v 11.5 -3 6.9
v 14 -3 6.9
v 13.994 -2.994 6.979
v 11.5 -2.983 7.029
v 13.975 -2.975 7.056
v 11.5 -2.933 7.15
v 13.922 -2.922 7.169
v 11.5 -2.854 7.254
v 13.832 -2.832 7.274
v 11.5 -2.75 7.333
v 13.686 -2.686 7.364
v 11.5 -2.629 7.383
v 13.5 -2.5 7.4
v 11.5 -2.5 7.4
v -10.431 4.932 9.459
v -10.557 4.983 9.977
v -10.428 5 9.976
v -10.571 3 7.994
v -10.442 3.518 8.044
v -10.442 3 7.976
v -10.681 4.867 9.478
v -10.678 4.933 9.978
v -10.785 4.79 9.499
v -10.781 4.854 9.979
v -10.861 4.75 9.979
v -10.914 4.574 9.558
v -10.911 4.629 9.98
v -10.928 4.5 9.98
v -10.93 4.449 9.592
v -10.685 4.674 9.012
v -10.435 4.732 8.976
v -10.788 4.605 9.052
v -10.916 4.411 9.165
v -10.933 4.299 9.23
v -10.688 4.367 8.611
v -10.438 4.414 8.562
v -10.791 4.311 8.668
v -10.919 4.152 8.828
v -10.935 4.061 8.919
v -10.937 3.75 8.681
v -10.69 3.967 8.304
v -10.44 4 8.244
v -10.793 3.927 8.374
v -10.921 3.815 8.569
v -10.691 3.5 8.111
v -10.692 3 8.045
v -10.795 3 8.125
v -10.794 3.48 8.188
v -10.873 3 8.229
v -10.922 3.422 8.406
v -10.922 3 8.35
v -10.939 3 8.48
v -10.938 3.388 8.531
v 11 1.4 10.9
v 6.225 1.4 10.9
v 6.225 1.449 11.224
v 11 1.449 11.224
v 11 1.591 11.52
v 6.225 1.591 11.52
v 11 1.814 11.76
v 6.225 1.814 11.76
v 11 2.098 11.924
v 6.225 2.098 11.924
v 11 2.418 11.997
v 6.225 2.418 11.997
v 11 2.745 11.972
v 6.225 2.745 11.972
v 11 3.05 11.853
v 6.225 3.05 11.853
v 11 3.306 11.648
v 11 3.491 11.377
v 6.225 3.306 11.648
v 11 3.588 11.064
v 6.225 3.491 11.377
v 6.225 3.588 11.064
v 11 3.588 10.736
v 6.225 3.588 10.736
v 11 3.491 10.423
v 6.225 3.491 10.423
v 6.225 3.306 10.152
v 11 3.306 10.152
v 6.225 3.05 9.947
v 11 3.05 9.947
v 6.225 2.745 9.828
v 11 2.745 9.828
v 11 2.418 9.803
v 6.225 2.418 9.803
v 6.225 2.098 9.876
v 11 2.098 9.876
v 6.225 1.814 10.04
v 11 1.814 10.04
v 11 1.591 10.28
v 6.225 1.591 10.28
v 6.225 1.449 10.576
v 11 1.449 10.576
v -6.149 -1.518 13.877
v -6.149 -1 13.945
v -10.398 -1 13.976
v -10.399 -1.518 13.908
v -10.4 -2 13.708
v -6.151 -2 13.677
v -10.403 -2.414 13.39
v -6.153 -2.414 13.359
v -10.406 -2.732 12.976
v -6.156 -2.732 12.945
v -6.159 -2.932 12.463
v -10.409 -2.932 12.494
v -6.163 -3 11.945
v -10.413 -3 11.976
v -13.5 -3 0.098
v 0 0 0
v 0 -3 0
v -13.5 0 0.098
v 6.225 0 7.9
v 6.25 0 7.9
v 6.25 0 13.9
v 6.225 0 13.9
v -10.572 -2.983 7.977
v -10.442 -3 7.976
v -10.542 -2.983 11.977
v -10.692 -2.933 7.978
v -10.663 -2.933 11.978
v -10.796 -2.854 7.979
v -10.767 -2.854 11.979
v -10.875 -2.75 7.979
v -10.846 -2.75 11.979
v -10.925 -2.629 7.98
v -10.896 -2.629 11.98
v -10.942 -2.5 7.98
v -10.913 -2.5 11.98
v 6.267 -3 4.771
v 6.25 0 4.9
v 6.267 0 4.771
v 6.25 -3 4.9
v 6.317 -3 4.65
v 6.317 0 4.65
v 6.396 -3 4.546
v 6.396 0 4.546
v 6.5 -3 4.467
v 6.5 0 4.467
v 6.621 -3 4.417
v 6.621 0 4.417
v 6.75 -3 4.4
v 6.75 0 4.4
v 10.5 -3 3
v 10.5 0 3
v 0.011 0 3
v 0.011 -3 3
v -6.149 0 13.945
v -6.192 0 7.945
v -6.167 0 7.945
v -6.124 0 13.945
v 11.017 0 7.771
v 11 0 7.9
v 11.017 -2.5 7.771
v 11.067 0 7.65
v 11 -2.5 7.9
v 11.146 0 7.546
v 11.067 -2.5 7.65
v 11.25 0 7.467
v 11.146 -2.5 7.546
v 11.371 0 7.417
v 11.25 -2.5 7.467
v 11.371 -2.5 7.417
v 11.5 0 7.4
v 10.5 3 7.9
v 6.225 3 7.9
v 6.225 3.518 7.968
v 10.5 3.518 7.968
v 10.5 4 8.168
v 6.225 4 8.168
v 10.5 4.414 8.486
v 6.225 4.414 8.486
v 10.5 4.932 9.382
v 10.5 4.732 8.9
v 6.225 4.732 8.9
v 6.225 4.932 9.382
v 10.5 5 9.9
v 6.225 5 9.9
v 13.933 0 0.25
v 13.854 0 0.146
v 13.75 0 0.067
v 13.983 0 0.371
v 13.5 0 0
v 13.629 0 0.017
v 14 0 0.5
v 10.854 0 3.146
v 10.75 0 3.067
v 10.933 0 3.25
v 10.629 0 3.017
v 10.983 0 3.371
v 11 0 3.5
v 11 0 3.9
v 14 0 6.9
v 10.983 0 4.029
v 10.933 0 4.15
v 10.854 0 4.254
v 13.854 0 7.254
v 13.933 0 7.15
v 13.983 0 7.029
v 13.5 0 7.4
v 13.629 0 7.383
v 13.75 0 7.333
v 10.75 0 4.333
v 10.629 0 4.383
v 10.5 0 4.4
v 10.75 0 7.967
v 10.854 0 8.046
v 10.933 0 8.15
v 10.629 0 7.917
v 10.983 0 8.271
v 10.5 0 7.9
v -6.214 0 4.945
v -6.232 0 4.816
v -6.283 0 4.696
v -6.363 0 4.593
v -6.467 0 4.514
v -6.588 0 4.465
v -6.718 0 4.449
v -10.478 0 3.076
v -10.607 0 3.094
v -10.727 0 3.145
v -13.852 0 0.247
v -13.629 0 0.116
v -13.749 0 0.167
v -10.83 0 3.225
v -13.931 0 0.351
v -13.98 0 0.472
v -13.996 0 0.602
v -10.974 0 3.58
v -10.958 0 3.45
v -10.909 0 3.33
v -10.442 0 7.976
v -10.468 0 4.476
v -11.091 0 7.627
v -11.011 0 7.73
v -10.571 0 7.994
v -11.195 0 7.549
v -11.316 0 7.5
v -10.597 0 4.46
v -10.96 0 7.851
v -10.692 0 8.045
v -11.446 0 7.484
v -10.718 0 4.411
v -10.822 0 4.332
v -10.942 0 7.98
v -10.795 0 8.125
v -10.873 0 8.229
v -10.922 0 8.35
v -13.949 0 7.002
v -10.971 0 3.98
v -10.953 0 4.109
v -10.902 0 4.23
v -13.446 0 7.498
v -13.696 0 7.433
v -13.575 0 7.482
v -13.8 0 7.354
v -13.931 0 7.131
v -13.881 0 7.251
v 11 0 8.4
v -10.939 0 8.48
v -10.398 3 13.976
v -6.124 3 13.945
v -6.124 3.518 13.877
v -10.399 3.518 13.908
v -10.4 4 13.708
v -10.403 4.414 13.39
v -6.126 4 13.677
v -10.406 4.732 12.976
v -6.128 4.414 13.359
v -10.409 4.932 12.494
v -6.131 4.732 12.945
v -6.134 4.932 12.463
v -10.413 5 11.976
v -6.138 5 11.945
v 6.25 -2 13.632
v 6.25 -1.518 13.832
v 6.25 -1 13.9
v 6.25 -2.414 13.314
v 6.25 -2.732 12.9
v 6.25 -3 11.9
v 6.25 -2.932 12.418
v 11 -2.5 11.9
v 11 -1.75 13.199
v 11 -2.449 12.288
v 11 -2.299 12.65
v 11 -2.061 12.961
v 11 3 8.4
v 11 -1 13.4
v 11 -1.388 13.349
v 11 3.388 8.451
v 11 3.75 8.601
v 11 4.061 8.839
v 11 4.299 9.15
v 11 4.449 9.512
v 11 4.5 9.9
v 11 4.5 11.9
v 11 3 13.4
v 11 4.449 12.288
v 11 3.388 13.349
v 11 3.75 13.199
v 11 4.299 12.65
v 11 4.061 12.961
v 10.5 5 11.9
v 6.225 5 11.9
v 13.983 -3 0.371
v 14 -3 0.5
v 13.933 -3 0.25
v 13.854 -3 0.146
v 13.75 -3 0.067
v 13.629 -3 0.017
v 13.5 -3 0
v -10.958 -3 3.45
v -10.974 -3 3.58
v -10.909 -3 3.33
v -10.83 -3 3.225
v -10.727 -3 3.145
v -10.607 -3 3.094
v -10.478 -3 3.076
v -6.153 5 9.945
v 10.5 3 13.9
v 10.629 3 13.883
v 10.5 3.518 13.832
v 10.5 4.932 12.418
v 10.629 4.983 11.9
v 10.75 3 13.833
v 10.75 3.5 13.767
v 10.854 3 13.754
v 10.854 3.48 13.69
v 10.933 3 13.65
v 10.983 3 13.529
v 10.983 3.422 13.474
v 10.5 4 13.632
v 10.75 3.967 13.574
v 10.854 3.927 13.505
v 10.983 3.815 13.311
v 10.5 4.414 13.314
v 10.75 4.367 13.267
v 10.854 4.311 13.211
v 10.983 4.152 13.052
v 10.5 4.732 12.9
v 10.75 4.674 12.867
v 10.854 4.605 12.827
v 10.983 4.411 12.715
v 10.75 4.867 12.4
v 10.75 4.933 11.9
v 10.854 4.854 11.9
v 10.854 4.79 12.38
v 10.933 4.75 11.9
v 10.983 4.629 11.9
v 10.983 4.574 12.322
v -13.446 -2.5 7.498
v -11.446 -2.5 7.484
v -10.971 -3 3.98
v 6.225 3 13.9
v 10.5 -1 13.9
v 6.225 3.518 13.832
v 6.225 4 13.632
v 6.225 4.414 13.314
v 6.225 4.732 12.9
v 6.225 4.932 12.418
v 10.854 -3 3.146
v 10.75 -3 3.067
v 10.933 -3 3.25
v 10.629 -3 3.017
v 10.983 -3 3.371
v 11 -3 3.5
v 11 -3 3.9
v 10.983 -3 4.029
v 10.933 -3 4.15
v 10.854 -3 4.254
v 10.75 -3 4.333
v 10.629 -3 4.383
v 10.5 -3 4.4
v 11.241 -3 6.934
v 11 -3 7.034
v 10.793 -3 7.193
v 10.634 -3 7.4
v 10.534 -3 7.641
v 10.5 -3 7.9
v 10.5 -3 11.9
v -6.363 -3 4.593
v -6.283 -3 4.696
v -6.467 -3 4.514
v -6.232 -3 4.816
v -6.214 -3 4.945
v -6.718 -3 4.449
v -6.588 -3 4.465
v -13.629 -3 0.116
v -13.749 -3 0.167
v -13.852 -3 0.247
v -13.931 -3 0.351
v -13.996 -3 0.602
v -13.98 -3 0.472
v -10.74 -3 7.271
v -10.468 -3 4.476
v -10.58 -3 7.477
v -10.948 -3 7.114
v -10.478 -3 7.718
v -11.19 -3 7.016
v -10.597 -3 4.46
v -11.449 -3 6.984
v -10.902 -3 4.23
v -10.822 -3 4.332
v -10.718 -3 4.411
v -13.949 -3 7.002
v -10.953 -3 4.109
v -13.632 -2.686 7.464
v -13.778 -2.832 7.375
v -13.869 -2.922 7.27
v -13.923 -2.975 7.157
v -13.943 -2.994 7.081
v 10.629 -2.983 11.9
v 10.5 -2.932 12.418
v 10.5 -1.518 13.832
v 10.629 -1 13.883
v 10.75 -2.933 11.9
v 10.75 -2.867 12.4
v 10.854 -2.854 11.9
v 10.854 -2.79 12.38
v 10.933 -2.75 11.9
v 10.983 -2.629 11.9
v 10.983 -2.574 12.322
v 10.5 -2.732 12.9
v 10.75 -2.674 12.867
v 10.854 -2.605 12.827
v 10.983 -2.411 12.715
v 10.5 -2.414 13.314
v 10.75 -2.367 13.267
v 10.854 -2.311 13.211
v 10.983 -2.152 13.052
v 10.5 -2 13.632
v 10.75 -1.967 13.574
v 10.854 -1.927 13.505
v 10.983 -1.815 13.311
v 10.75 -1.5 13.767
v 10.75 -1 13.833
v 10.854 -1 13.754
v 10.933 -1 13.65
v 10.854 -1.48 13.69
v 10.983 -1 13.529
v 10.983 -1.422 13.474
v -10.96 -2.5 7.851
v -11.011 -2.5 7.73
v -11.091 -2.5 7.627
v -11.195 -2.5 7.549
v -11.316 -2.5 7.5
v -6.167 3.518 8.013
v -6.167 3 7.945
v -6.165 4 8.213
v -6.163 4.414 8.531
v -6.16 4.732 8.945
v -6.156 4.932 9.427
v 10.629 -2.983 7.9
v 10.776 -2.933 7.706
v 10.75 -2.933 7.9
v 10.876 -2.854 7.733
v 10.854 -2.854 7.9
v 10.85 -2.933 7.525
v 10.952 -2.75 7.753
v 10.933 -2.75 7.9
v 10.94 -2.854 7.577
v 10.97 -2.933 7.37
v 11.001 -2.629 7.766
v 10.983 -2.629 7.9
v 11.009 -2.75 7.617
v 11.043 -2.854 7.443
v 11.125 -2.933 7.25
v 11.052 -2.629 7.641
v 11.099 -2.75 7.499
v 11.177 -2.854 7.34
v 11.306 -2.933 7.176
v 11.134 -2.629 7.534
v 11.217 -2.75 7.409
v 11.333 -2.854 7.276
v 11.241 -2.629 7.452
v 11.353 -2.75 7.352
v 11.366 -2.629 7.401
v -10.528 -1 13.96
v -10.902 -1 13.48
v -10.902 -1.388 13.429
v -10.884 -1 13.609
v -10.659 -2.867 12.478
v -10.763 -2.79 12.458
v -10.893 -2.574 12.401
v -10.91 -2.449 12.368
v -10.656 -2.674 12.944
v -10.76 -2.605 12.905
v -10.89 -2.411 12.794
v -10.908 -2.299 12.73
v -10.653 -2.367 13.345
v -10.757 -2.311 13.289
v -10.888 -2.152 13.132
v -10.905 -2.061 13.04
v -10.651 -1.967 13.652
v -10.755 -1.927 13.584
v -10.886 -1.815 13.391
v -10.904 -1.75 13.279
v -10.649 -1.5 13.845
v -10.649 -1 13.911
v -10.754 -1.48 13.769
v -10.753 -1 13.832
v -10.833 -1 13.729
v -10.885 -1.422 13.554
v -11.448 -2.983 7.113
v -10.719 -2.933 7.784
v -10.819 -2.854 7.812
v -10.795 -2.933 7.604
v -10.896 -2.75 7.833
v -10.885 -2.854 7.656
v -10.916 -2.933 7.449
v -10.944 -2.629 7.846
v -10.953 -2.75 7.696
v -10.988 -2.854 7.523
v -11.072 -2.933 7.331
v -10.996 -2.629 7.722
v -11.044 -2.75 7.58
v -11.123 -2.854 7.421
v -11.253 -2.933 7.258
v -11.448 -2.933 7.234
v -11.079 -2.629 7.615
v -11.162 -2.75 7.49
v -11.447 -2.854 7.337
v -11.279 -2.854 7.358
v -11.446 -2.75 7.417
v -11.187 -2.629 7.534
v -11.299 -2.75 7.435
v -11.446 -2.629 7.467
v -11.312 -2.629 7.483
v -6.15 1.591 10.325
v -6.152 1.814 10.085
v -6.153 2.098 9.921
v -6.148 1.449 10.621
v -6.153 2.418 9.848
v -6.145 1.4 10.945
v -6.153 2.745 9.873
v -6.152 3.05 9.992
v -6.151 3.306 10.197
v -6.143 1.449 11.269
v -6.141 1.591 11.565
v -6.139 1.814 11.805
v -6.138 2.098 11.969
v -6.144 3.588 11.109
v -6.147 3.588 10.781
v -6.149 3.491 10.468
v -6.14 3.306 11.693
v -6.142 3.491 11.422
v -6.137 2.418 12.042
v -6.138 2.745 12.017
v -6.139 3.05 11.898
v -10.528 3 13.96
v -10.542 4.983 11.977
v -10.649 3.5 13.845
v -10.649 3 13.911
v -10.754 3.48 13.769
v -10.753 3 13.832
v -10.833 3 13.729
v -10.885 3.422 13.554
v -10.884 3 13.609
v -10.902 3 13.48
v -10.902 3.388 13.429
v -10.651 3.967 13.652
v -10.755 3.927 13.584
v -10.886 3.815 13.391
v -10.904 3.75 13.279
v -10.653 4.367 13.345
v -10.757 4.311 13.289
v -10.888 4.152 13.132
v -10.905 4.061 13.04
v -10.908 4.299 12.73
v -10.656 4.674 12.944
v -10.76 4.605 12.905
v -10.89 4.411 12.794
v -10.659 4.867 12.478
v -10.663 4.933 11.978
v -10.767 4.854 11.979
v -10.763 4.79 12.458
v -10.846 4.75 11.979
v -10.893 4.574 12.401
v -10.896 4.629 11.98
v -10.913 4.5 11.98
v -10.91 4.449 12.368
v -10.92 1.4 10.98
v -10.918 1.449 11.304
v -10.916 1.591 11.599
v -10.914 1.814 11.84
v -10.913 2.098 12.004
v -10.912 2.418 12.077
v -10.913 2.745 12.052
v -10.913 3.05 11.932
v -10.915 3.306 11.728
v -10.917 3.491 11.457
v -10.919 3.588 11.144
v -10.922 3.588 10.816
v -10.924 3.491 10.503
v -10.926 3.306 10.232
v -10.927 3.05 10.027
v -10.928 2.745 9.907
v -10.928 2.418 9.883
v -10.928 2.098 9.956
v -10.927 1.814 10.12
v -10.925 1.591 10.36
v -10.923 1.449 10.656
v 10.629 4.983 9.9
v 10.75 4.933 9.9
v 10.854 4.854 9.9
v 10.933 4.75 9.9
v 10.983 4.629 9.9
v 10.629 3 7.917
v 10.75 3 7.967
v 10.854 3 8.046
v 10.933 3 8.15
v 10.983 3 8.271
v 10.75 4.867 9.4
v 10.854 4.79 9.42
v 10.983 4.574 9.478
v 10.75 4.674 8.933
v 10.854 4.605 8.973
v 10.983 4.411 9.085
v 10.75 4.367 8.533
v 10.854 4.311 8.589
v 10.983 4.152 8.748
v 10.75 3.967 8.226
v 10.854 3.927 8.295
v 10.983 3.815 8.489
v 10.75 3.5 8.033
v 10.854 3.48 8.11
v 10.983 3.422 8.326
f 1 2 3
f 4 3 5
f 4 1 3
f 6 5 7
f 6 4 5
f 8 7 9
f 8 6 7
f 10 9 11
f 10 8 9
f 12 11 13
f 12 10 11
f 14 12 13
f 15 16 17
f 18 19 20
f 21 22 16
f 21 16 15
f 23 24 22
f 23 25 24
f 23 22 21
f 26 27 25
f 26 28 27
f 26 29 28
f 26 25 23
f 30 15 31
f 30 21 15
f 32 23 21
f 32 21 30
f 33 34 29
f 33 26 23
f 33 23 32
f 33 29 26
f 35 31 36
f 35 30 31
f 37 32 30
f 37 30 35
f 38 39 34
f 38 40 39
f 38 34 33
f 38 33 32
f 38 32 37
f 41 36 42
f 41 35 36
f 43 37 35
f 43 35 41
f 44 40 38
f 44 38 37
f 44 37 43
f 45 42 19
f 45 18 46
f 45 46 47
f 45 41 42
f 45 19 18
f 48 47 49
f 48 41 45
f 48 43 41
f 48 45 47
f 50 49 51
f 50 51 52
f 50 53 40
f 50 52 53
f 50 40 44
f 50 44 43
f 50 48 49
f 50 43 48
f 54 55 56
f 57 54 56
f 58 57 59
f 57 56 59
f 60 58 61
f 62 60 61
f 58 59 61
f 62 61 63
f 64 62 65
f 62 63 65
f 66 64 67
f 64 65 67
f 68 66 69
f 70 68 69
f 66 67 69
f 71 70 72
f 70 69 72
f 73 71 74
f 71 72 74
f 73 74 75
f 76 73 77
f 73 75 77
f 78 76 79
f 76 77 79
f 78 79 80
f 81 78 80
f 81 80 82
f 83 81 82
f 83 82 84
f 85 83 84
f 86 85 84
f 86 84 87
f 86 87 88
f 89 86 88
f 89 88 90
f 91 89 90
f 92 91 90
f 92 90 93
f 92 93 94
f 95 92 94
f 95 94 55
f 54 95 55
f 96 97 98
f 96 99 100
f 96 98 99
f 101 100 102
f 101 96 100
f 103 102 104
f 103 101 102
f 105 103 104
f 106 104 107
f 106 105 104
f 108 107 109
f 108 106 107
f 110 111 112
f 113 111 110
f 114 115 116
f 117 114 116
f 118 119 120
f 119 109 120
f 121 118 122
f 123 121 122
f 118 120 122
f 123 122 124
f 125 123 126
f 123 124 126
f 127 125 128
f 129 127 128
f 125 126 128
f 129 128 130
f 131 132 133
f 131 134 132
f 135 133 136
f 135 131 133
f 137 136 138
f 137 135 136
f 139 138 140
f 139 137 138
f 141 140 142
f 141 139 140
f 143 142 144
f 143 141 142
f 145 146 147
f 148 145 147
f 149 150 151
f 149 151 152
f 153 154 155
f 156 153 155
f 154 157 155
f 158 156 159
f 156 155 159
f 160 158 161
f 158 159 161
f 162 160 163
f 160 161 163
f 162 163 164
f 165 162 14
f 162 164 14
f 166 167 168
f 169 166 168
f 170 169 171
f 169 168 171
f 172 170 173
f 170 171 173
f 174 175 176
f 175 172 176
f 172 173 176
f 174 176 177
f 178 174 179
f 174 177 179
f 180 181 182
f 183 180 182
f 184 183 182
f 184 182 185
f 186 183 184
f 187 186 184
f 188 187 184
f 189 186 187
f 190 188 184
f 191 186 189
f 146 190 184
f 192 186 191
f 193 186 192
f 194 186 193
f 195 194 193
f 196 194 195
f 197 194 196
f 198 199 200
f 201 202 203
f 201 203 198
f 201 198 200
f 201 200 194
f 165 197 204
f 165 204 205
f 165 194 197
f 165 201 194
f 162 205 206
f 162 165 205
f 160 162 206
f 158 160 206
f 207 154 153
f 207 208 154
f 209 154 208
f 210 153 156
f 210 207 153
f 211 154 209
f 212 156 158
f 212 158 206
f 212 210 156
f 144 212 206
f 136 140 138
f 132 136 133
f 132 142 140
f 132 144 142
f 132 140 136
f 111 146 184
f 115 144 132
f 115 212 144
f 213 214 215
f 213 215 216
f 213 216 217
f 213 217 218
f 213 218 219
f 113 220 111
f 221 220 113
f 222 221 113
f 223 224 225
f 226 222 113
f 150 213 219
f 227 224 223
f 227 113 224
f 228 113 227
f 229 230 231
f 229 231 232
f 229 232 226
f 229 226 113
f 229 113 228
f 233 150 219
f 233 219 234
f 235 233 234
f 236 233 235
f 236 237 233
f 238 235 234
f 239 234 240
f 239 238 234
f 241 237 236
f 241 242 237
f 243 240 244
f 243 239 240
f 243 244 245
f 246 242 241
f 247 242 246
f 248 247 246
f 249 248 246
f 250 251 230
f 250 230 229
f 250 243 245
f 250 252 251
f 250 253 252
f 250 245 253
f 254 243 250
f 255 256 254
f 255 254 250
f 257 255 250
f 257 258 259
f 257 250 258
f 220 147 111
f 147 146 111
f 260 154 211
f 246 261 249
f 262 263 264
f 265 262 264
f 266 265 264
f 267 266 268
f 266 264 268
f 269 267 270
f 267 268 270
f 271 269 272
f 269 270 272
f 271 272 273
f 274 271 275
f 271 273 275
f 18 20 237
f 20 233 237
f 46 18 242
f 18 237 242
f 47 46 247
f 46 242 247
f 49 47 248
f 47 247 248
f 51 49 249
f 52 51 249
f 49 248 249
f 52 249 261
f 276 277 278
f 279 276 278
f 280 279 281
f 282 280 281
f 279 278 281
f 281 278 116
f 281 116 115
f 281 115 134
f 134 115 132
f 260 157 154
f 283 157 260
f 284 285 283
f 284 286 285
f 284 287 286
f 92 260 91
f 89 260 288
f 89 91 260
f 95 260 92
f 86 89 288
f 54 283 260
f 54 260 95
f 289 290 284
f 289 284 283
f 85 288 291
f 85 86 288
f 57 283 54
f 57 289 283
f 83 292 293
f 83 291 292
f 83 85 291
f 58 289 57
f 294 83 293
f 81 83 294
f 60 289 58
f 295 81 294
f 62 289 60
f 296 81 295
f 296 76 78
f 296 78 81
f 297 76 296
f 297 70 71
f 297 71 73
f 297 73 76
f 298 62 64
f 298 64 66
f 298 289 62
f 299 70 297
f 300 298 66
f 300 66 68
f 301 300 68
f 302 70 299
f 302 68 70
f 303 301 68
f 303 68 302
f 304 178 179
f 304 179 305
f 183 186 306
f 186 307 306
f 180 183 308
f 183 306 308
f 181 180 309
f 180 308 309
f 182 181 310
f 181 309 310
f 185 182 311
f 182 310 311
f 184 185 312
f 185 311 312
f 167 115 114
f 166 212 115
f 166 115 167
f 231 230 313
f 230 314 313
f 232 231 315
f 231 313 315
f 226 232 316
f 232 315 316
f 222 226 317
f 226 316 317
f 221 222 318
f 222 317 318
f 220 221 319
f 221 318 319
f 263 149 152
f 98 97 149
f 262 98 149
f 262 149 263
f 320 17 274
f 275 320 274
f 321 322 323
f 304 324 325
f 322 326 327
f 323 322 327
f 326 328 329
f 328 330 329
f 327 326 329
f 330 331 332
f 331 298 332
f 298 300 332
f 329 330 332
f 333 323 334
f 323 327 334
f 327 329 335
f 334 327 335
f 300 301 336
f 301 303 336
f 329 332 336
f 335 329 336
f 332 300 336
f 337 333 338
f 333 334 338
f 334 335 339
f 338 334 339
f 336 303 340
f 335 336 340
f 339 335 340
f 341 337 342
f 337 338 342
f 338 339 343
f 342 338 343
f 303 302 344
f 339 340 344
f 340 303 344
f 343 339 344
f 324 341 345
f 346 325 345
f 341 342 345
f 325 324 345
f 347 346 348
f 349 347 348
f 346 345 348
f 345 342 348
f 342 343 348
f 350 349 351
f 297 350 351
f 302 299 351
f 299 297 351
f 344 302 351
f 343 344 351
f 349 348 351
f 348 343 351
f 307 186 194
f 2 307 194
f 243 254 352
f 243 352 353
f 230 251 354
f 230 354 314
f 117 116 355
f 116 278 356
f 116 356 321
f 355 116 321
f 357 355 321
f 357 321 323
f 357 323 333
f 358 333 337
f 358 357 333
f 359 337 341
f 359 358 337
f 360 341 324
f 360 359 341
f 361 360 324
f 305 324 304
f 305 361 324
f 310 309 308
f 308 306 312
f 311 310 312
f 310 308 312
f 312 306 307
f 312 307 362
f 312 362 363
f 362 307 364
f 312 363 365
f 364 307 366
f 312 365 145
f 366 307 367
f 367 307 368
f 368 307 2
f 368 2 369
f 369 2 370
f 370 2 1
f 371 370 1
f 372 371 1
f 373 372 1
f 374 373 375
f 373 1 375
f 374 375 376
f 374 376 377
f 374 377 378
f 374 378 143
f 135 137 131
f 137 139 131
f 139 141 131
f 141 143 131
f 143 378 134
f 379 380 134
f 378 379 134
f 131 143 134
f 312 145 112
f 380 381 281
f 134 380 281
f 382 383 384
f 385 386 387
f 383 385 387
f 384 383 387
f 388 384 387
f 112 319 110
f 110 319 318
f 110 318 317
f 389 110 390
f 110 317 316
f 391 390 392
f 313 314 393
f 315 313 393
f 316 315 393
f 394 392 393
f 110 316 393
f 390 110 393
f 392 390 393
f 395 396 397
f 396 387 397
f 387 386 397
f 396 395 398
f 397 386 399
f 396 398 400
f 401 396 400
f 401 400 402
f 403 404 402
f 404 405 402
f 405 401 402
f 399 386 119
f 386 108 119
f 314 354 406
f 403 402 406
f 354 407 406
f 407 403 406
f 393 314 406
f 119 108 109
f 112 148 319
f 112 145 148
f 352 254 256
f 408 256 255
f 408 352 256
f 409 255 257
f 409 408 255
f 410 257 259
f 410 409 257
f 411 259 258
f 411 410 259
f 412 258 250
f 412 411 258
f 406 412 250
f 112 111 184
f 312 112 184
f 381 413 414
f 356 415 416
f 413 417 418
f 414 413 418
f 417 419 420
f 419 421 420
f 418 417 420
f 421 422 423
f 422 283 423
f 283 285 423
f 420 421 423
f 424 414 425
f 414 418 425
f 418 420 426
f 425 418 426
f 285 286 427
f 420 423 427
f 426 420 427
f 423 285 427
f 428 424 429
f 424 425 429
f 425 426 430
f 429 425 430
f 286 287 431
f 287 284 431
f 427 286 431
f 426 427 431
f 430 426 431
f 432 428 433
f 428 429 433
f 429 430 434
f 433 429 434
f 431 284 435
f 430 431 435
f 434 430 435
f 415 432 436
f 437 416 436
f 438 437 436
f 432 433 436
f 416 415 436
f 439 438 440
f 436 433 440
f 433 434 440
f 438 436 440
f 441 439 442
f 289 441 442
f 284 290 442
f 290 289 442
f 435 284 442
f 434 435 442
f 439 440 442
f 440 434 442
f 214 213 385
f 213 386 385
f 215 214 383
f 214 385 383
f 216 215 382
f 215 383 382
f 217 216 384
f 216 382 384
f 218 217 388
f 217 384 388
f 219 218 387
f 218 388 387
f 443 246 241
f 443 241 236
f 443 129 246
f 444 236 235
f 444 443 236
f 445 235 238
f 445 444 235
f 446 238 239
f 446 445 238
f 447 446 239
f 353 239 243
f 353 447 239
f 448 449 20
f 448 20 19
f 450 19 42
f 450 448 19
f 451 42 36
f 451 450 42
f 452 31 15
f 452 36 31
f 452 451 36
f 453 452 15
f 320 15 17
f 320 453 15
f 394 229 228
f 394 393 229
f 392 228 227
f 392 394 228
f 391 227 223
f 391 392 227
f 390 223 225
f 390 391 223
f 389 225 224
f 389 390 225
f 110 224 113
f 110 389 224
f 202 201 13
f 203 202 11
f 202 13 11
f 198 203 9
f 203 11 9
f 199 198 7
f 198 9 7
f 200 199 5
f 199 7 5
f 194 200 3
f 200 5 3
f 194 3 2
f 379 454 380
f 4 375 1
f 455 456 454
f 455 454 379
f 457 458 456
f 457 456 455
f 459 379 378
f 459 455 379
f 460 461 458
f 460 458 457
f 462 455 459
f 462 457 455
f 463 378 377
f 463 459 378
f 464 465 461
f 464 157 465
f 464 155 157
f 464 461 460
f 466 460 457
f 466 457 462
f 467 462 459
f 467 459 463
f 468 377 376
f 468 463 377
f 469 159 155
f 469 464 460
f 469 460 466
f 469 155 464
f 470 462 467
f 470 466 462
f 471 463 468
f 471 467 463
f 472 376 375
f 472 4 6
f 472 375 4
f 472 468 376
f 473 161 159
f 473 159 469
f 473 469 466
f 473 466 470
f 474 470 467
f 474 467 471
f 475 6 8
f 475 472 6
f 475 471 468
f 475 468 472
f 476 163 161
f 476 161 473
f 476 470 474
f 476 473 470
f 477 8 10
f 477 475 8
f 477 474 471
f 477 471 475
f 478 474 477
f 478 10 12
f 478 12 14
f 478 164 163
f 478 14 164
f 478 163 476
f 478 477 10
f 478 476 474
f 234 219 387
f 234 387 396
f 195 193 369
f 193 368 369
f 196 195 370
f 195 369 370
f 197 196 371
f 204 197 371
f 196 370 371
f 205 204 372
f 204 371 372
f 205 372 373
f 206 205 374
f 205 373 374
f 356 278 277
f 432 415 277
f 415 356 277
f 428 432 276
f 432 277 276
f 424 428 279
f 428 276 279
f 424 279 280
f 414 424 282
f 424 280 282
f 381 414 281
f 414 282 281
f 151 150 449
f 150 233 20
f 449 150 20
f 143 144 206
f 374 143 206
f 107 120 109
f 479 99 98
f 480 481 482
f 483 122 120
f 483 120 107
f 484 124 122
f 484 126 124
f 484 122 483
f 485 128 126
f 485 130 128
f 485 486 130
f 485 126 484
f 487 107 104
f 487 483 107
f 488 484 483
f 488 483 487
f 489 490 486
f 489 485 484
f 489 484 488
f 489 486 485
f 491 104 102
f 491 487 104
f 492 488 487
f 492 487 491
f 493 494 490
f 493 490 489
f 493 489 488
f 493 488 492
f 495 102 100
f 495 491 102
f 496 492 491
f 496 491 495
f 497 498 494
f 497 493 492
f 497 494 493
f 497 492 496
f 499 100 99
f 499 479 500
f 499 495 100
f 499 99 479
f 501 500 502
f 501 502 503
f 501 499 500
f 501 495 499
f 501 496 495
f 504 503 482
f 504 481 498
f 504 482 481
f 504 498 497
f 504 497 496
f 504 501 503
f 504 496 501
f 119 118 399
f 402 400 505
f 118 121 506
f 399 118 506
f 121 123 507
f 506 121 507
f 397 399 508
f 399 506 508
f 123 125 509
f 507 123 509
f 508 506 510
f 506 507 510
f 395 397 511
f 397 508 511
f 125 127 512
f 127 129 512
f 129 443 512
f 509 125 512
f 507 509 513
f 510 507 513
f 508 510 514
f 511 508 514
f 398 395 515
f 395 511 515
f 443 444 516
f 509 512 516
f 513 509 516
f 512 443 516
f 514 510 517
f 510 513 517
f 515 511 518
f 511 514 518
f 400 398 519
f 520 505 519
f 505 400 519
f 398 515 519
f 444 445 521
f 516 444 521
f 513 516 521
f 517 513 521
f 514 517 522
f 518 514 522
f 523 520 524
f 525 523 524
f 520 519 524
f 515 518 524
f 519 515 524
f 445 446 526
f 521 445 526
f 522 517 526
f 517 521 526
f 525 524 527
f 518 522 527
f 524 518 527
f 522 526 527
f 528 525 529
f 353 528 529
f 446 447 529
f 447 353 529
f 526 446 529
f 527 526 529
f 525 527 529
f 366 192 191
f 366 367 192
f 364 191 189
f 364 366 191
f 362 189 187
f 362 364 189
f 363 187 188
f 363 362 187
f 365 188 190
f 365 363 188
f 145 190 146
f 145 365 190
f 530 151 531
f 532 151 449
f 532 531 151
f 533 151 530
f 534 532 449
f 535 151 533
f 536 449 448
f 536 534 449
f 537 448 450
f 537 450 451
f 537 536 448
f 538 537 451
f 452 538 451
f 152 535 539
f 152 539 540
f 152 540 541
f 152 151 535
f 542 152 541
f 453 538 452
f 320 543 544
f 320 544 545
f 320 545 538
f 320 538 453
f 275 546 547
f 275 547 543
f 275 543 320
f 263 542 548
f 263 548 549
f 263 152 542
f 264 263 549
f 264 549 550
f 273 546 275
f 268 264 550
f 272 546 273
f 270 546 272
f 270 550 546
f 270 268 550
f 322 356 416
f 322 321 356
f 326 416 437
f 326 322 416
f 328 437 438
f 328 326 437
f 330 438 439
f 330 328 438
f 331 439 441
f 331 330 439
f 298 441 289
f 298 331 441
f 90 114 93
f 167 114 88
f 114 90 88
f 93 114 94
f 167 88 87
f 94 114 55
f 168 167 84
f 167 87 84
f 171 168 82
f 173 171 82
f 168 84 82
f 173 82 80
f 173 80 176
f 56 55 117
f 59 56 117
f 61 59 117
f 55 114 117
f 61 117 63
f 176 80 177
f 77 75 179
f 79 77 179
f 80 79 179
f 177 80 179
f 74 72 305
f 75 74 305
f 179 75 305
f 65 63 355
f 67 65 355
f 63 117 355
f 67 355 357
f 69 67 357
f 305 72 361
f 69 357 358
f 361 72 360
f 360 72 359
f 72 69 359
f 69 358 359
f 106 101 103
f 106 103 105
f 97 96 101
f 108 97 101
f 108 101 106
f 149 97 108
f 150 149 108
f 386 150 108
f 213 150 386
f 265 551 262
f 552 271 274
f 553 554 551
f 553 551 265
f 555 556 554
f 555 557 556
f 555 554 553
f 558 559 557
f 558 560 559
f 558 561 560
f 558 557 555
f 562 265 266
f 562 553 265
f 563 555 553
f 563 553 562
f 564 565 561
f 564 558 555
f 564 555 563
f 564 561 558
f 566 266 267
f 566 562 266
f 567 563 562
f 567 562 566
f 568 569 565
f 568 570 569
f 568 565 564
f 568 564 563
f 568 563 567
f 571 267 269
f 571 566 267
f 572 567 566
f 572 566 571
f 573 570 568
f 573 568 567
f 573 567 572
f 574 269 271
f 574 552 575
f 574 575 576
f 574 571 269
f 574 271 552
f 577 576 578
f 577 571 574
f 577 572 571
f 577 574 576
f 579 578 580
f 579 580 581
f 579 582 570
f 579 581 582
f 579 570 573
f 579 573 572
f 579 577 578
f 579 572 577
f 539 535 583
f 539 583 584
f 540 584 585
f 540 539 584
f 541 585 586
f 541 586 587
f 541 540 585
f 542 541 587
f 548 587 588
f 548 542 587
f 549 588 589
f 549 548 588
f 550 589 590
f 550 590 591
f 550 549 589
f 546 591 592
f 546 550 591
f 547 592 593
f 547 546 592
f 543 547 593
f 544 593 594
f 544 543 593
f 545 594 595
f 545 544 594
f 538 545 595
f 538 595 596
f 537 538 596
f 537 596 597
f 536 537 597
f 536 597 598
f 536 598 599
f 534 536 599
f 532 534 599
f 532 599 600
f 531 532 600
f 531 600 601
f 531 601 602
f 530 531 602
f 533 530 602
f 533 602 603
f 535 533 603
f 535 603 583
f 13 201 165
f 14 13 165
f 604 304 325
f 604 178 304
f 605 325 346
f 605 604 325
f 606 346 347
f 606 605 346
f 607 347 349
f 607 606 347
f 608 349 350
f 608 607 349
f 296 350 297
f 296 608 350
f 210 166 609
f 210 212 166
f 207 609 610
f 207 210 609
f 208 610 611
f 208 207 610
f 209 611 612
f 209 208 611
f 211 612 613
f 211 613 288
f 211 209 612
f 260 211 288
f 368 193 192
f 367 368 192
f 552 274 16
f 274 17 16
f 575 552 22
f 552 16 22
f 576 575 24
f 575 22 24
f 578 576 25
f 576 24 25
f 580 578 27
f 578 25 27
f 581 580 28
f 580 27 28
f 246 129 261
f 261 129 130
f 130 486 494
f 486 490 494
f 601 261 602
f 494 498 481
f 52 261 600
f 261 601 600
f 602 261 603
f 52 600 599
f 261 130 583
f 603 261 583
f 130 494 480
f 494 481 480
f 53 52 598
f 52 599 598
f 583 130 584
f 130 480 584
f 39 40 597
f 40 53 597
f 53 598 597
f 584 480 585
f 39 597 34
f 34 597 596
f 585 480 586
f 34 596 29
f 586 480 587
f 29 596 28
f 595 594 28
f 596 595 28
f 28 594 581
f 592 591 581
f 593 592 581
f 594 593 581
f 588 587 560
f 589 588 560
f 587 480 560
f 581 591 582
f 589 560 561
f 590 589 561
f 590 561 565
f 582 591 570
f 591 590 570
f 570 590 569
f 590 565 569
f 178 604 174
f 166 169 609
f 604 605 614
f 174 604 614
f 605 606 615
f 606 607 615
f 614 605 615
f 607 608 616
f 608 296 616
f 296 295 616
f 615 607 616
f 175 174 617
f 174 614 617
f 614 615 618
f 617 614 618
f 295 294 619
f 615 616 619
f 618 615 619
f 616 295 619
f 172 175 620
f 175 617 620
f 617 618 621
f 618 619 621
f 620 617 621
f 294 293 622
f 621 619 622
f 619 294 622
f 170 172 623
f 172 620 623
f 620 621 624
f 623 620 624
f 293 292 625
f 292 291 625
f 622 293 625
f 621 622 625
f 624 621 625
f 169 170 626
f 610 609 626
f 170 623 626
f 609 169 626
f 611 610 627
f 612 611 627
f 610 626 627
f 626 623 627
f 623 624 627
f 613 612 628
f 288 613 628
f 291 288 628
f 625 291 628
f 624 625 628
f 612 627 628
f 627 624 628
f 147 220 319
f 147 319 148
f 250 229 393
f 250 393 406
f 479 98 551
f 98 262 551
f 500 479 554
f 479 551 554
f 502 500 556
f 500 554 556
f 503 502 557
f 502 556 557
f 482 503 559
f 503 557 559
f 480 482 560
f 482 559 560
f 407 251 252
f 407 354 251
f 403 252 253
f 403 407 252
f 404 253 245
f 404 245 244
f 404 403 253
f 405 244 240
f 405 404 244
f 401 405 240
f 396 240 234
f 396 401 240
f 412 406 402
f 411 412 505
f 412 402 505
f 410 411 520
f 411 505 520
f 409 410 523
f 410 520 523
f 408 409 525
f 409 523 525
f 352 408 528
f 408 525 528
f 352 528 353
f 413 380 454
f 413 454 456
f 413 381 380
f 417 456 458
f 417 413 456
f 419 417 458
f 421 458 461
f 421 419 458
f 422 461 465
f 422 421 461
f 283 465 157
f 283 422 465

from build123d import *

# Parameters (mm, degrees)
F1_DEPTH = 3
F2_W     = 5
F2_H     = 6
F3_DEPTH = 4.775
F4_D     = 2.2
F5_R     = 2
F6_R     = 0.5


# Not quite as in the source:
# - a feature names something its author has since deleted; it is built from what else it names


with BuildPart() as f1:
    # F0 (on Front) → F1 (new body)
    with BuildSketch(Plane.XZ):
        Polygon((0.0109257422, 3), (0, 0), (14, 0), (14, 7.4), (11, 7.4), (11, 13.9), (6.25, 13.9), (6.25, 4.4), (11, 4.4), (11, 3), align=None)
    extrude(amount=F1_DEPTH)

    # F2 (on face) → F3 (join)
    with BuildSketch(Plane.YZ.offset(11)):
        with Locations((2.5, 10.9)):
            Rectangle(F2_W, F2_H)
    extrude(amount=-F3_DEPTH)

    # F4 (through all)
    with Locations(Plane.YZ.offset(11)):
        with Locations((2.5, 10.9)):
            Hole(F4_D / 2)

    # F5
    f5_edges = [f1.edges().sort_by_distance(p)[0] for p in [
        (8.6125, 5, 13.9),
        (8.6125, 5, 7.9),
        (8.625, -3, 13.9),
    ]]
    fillet(f5_edges, radius=F5_R)

    # F6 (call 1 of 5: OpenCascade refuses the feature's edges together)
    f6_edges = [f1.edges().sort_by_distance(p)[0] for p in [
        (14, -1.5, 7.4),
        (11, -1.5, 7.4),
        (11, 1, 13.9),
        (11, -3, 9.65),
        (12.5, -3, 7.4),
        (11, -2.414214, 13.314214),
        (11, 4.414214, 13.314214),
        (11, 1.5, 7.9),
        (11, 5, 10.9),
        (11, 4.414214, 8.485786),
    ]]
    fillet(f6_edges, radius=F6_R)

    # F6#2 (call 2 of 5)
    f6_2_edges = [f1.edges().sort_by_distance(p)[0] for p in [
        (6.25, -1.5, 4.4),
    ]]
    fillet(f6_2_edges, radius=F6_R)

    # F6#3 (call 3 of 5)
    f6_3_edges = [f1.edges().sort_by_distance(p)[0] for p in [
        (14, -1.5, 0),
    ]]
    fillet(f6_3_edges, radius=F6_R)

    # F6#4 (call 4 of 5)
    f6_4_edges = [f1.edges().sort_by_distance(p)[0] for p in [
        (11, -1.5, 4.4),
    ]]
    fillet(f6_4_edges, radius=F6_R)

    # F6#5 (call 5 of 5)
    f6_5_edges = [f1.edges().sort_by_distance(p)[0] for p in [
        (11, -1.5, 3),
    ]]
    fillet(f6_5_edges, radius=F6_R)

    # F7: F1 across face


with BuildPart() as f1_1:
    add(f1.part)
    add(f1.part.mirror(Plane(origin=(0.0054628711, -1.5, 1.5), x_dir=(0, -1, 0), z_dir=(-0.9999933683, 0, 0.0036418899))))


solid = f1_1.part
